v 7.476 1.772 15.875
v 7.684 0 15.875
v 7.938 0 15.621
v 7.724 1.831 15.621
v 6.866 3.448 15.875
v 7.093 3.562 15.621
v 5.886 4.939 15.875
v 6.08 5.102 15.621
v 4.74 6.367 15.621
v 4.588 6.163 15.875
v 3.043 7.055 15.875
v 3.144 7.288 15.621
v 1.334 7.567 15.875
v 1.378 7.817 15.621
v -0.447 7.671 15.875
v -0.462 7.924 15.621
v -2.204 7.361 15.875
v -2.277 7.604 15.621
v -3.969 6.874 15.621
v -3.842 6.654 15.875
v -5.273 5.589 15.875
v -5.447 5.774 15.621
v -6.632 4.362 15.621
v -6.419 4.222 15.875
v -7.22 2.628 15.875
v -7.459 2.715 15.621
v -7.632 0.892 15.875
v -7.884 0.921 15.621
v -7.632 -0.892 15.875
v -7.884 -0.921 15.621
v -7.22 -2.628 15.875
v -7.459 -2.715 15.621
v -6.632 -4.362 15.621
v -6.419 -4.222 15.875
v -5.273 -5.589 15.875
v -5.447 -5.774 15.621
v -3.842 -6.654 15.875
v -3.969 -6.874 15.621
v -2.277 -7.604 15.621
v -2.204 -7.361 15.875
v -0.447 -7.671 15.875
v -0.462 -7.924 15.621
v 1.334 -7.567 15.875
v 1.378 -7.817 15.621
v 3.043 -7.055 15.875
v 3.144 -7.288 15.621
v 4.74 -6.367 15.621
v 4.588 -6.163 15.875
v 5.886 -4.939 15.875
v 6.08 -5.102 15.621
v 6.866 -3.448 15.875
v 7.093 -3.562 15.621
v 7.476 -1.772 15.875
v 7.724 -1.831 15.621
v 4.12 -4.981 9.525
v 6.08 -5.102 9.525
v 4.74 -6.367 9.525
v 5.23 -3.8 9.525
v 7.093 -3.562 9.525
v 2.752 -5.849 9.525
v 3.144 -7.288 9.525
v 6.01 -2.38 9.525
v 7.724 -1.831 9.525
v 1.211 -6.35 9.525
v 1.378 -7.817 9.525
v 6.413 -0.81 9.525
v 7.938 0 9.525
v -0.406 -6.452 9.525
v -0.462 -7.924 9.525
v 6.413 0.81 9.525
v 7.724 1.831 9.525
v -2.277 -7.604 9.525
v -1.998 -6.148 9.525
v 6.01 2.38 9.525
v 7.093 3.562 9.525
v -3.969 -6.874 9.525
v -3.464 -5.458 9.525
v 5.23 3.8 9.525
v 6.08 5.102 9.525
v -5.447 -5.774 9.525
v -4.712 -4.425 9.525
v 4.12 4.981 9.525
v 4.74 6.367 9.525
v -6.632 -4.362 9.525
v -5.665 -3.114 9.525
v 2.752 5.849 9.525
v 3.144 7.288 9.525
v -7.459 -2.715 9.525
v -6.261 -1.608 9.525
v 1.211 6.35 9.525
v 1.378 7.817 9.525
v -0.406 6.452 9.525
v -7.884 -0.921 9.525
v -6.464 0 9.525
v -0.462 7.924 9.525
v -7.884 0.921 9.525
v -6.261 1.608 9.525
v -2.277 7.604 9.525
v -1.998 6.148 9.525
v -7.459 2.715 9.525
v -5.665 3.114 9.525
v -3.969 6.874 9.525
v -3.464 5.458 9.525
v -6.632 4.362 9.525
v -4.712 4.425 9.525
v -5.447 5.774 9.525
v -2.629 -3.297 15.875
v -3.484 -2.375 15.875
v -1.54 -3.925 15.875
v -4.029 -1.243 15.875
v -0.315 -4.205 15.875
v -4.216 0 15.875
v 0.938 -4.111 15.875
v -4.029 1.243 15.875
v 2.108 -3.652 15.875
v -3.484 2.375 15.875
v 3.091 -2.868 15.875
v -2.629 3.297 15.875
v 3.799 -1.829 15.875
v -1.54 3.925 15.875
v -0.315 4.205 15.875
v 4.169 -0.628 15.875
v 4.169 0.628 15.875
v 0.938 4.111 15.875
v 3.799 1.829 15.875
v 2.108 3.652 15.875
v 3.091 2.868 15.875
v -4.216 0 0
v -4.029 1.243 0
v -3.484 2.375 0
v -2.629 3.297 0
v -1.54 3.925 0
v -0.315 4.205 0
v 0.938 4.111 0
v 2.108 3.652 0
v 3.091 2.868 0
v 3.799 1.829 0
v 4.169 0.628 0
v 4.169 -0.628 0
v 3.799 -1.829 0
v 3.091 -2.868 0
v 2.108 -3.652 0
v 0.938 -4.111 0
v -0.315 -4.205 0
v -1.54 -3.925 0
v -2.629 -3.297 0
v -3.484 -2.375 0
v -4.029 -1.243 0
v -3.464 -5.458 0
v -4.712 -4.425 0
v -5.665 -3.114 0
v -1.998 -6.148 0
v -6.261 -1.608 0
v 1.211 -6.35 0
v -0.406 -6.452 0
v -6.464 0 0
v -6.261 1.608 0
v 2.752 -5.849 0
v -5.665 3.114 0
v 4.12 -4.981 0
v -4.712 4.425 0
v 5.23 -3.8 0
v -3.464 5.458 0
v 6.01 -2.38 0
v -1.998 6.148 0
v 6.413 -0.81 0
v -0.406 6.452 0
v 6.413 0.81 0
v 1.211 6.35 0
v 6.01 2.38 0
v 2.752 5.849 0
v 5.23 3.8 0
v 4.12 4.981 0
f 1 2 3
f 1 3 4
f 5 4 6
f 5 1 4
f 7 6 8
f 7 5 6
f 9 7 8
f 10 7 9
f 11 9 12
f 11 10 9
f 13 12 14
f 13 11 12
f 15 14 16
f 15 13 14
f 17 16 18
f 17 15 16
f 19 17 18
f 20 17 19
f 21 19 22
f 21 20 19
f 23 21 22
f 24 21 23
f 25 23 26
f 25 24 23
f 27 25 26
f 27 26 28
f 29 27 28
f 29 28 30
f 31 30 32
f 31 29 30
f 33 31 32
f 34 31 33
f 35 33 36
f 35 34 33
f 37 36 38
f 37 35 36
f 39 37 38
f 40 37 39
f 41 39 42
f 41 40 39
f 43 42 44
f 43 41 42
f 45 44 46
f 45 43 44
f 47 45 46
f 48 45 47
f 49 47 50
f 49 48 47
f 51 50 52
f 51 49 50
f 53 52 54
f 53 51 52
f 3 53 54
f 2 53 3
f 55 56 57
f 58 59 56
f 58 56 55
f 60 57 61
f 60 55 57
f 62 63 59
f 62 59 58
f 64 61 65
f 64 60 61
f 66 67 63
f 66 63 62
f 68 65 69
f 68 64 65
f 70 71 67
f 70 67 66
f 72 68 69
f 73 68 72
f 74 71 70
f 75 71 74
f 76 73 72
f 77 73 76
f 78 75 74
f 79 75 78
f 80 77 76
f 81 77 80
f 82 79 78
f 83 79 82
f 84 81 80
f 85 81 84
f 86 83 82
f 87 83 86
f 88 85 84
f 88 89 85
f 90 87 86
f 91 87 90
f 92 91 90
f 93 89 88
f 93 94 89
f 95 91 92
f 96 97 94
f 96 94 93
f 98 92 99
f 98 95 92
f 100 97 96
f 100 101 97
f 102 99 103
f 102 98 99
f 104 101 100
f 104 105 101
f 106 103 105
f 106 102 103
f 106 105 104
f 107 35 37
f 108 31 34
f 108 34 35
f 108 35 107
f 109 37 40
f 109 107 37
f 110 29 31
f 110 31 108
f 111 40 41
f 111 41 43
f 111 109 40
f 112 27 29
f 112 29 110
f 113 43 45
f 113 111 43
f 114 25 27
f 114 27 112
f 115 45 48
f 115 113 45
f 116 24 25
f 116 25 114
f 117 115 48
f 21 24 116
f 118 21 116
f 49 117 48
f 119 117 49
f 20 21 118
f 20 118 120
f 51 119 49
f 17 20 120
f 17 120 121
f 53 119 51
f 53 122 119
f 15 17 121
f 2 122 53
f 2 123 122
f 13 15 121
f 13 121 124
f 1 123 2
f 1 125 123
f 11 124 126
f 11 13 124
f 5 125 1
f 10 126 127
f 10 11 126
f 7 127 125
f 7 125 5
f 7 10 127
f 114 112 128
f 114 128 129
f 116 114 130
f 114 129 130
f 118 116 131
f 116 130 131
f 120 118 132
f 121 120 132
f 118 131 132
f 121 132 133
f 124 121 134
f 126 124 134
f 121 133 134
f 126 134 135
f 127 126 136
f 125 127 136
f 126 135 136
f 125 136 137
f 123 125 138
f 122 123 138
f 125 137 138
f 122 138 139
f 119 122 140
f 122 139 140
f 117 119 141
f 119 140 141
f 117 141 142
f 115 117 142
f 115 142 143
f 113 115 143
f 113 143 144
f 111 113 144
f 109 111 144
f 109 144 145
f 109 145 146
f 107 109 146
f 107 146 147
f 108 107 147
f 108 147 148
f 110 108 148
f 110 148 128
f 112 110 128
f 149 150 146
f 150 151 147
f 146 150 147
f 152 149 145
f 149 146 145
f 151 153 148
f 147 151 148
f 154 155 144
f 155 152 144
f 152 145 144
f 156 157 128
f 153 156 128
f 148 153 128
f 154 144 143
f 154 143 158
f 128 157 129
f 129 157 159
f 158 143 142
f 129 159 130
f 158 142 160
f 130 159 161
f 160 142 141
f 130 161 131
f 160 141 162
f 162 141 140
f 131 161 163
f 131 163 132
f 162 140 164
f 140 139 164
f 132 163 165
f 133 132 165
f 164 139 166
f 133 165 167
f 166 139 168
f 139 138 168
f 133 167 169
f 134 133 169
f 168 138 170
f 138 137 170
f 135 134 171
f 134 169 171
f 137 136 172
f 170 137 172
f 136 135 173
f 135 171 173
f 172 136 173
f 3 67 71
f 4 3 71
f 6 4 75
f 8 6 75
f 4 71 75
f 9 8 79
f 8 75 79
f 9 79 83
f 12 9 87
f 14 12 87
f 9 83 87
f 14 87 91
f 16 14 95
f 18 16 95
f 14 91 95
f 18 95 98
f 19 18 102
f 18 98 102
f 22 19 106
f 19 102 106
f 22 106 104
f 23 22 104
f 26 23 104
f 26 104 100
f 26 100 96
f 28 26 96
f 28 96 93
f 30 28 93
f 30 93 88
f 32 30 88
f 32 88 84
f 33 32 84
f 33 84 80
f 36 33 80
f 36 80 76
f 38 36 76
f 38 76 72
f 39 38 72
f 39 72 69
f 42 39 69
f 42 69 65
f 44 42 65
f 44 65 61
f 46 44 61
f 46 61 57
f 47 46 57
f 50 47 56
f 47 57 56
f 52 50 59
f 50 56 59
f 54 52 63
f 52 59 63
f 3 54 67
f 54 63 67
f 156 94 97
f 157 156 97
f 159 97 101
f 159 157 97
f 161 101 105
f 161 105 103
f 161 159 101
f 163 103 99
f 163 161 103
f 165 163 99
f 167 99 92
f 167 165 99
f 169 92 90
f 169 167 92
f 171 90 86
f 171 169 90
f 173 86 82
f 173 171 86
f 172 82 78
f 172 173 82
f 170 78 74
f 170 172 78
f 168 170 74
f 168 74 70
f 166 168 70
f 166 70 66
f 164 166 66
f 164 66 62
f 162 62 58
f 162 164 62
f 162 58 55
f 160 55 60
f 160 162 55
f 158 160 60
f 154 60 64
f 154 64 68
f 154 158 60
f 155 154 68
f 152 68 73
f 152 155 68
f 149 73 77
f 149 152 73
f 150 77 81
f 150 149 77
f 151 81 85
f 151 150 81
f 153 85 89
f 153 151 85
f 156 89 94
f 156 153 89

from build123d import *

# Parameters (mm, degrees)
SKETCH1_R                   = 7.9375
BOSS_EXTRUDE1_DEPTH         = 15.875
CHAMFER1_SIZE               = 0.254
SKETCH2_OUTSIDE_W           = 23.376
SKETCH2_OUTSIDE_H           = 23.376
SKETCH2_OUTSIDE_R           = 6.4643
CUT_EXTRUDE1_DEPTH          = 9.525
TAP_DRILL_FOR_3_8_24_TAP1_D = 8.4328


with BuildPart() as part:
    # Sketch1 → Boss-Extrude1 (new body)
    with BuildSketch(Plane.XY):
        Circle(SKETCH1_R)
    extrude(amount=BOSS_EXTRUDE1_DEPTH)

    # Chamfer1
    chamfer1_edges = [part.edges().sort_by_distance(p)[0] for p in [
        (-7.9375, 0, 15.875),
    ]]
    chamfer(chamfer1_edges, length=CHAMFER1_SIZE)

    # Sketch2 outside → Cut-Extrude1 (cut)
    with BuildSketch(Plane(origin=(0, 0, 0), x_dir=(-1, 0, 0), z_dir=(0, 0, -1))):
        Rectangle(SKETCH2_OUTSIDE_W, SKETCH2_OUTSIDE_H)
        Circle(SKETCH2_OUTSIDE_R, mode=Mode.SUBTRACT)
    extrude(amount=-CUT_EXTRUDE1_DEPTH, mode=Mode.SUBTRACT)

    # Tap Drill for 3/8-24 Tap1 (through all)
    with Locations(Plane.XY.offset(15.875)):
        with Locations((0, 0)):
            Hole(TAP_DRILL_FOR_3_8_24_TAP1_D / 2)


solid = part.part
